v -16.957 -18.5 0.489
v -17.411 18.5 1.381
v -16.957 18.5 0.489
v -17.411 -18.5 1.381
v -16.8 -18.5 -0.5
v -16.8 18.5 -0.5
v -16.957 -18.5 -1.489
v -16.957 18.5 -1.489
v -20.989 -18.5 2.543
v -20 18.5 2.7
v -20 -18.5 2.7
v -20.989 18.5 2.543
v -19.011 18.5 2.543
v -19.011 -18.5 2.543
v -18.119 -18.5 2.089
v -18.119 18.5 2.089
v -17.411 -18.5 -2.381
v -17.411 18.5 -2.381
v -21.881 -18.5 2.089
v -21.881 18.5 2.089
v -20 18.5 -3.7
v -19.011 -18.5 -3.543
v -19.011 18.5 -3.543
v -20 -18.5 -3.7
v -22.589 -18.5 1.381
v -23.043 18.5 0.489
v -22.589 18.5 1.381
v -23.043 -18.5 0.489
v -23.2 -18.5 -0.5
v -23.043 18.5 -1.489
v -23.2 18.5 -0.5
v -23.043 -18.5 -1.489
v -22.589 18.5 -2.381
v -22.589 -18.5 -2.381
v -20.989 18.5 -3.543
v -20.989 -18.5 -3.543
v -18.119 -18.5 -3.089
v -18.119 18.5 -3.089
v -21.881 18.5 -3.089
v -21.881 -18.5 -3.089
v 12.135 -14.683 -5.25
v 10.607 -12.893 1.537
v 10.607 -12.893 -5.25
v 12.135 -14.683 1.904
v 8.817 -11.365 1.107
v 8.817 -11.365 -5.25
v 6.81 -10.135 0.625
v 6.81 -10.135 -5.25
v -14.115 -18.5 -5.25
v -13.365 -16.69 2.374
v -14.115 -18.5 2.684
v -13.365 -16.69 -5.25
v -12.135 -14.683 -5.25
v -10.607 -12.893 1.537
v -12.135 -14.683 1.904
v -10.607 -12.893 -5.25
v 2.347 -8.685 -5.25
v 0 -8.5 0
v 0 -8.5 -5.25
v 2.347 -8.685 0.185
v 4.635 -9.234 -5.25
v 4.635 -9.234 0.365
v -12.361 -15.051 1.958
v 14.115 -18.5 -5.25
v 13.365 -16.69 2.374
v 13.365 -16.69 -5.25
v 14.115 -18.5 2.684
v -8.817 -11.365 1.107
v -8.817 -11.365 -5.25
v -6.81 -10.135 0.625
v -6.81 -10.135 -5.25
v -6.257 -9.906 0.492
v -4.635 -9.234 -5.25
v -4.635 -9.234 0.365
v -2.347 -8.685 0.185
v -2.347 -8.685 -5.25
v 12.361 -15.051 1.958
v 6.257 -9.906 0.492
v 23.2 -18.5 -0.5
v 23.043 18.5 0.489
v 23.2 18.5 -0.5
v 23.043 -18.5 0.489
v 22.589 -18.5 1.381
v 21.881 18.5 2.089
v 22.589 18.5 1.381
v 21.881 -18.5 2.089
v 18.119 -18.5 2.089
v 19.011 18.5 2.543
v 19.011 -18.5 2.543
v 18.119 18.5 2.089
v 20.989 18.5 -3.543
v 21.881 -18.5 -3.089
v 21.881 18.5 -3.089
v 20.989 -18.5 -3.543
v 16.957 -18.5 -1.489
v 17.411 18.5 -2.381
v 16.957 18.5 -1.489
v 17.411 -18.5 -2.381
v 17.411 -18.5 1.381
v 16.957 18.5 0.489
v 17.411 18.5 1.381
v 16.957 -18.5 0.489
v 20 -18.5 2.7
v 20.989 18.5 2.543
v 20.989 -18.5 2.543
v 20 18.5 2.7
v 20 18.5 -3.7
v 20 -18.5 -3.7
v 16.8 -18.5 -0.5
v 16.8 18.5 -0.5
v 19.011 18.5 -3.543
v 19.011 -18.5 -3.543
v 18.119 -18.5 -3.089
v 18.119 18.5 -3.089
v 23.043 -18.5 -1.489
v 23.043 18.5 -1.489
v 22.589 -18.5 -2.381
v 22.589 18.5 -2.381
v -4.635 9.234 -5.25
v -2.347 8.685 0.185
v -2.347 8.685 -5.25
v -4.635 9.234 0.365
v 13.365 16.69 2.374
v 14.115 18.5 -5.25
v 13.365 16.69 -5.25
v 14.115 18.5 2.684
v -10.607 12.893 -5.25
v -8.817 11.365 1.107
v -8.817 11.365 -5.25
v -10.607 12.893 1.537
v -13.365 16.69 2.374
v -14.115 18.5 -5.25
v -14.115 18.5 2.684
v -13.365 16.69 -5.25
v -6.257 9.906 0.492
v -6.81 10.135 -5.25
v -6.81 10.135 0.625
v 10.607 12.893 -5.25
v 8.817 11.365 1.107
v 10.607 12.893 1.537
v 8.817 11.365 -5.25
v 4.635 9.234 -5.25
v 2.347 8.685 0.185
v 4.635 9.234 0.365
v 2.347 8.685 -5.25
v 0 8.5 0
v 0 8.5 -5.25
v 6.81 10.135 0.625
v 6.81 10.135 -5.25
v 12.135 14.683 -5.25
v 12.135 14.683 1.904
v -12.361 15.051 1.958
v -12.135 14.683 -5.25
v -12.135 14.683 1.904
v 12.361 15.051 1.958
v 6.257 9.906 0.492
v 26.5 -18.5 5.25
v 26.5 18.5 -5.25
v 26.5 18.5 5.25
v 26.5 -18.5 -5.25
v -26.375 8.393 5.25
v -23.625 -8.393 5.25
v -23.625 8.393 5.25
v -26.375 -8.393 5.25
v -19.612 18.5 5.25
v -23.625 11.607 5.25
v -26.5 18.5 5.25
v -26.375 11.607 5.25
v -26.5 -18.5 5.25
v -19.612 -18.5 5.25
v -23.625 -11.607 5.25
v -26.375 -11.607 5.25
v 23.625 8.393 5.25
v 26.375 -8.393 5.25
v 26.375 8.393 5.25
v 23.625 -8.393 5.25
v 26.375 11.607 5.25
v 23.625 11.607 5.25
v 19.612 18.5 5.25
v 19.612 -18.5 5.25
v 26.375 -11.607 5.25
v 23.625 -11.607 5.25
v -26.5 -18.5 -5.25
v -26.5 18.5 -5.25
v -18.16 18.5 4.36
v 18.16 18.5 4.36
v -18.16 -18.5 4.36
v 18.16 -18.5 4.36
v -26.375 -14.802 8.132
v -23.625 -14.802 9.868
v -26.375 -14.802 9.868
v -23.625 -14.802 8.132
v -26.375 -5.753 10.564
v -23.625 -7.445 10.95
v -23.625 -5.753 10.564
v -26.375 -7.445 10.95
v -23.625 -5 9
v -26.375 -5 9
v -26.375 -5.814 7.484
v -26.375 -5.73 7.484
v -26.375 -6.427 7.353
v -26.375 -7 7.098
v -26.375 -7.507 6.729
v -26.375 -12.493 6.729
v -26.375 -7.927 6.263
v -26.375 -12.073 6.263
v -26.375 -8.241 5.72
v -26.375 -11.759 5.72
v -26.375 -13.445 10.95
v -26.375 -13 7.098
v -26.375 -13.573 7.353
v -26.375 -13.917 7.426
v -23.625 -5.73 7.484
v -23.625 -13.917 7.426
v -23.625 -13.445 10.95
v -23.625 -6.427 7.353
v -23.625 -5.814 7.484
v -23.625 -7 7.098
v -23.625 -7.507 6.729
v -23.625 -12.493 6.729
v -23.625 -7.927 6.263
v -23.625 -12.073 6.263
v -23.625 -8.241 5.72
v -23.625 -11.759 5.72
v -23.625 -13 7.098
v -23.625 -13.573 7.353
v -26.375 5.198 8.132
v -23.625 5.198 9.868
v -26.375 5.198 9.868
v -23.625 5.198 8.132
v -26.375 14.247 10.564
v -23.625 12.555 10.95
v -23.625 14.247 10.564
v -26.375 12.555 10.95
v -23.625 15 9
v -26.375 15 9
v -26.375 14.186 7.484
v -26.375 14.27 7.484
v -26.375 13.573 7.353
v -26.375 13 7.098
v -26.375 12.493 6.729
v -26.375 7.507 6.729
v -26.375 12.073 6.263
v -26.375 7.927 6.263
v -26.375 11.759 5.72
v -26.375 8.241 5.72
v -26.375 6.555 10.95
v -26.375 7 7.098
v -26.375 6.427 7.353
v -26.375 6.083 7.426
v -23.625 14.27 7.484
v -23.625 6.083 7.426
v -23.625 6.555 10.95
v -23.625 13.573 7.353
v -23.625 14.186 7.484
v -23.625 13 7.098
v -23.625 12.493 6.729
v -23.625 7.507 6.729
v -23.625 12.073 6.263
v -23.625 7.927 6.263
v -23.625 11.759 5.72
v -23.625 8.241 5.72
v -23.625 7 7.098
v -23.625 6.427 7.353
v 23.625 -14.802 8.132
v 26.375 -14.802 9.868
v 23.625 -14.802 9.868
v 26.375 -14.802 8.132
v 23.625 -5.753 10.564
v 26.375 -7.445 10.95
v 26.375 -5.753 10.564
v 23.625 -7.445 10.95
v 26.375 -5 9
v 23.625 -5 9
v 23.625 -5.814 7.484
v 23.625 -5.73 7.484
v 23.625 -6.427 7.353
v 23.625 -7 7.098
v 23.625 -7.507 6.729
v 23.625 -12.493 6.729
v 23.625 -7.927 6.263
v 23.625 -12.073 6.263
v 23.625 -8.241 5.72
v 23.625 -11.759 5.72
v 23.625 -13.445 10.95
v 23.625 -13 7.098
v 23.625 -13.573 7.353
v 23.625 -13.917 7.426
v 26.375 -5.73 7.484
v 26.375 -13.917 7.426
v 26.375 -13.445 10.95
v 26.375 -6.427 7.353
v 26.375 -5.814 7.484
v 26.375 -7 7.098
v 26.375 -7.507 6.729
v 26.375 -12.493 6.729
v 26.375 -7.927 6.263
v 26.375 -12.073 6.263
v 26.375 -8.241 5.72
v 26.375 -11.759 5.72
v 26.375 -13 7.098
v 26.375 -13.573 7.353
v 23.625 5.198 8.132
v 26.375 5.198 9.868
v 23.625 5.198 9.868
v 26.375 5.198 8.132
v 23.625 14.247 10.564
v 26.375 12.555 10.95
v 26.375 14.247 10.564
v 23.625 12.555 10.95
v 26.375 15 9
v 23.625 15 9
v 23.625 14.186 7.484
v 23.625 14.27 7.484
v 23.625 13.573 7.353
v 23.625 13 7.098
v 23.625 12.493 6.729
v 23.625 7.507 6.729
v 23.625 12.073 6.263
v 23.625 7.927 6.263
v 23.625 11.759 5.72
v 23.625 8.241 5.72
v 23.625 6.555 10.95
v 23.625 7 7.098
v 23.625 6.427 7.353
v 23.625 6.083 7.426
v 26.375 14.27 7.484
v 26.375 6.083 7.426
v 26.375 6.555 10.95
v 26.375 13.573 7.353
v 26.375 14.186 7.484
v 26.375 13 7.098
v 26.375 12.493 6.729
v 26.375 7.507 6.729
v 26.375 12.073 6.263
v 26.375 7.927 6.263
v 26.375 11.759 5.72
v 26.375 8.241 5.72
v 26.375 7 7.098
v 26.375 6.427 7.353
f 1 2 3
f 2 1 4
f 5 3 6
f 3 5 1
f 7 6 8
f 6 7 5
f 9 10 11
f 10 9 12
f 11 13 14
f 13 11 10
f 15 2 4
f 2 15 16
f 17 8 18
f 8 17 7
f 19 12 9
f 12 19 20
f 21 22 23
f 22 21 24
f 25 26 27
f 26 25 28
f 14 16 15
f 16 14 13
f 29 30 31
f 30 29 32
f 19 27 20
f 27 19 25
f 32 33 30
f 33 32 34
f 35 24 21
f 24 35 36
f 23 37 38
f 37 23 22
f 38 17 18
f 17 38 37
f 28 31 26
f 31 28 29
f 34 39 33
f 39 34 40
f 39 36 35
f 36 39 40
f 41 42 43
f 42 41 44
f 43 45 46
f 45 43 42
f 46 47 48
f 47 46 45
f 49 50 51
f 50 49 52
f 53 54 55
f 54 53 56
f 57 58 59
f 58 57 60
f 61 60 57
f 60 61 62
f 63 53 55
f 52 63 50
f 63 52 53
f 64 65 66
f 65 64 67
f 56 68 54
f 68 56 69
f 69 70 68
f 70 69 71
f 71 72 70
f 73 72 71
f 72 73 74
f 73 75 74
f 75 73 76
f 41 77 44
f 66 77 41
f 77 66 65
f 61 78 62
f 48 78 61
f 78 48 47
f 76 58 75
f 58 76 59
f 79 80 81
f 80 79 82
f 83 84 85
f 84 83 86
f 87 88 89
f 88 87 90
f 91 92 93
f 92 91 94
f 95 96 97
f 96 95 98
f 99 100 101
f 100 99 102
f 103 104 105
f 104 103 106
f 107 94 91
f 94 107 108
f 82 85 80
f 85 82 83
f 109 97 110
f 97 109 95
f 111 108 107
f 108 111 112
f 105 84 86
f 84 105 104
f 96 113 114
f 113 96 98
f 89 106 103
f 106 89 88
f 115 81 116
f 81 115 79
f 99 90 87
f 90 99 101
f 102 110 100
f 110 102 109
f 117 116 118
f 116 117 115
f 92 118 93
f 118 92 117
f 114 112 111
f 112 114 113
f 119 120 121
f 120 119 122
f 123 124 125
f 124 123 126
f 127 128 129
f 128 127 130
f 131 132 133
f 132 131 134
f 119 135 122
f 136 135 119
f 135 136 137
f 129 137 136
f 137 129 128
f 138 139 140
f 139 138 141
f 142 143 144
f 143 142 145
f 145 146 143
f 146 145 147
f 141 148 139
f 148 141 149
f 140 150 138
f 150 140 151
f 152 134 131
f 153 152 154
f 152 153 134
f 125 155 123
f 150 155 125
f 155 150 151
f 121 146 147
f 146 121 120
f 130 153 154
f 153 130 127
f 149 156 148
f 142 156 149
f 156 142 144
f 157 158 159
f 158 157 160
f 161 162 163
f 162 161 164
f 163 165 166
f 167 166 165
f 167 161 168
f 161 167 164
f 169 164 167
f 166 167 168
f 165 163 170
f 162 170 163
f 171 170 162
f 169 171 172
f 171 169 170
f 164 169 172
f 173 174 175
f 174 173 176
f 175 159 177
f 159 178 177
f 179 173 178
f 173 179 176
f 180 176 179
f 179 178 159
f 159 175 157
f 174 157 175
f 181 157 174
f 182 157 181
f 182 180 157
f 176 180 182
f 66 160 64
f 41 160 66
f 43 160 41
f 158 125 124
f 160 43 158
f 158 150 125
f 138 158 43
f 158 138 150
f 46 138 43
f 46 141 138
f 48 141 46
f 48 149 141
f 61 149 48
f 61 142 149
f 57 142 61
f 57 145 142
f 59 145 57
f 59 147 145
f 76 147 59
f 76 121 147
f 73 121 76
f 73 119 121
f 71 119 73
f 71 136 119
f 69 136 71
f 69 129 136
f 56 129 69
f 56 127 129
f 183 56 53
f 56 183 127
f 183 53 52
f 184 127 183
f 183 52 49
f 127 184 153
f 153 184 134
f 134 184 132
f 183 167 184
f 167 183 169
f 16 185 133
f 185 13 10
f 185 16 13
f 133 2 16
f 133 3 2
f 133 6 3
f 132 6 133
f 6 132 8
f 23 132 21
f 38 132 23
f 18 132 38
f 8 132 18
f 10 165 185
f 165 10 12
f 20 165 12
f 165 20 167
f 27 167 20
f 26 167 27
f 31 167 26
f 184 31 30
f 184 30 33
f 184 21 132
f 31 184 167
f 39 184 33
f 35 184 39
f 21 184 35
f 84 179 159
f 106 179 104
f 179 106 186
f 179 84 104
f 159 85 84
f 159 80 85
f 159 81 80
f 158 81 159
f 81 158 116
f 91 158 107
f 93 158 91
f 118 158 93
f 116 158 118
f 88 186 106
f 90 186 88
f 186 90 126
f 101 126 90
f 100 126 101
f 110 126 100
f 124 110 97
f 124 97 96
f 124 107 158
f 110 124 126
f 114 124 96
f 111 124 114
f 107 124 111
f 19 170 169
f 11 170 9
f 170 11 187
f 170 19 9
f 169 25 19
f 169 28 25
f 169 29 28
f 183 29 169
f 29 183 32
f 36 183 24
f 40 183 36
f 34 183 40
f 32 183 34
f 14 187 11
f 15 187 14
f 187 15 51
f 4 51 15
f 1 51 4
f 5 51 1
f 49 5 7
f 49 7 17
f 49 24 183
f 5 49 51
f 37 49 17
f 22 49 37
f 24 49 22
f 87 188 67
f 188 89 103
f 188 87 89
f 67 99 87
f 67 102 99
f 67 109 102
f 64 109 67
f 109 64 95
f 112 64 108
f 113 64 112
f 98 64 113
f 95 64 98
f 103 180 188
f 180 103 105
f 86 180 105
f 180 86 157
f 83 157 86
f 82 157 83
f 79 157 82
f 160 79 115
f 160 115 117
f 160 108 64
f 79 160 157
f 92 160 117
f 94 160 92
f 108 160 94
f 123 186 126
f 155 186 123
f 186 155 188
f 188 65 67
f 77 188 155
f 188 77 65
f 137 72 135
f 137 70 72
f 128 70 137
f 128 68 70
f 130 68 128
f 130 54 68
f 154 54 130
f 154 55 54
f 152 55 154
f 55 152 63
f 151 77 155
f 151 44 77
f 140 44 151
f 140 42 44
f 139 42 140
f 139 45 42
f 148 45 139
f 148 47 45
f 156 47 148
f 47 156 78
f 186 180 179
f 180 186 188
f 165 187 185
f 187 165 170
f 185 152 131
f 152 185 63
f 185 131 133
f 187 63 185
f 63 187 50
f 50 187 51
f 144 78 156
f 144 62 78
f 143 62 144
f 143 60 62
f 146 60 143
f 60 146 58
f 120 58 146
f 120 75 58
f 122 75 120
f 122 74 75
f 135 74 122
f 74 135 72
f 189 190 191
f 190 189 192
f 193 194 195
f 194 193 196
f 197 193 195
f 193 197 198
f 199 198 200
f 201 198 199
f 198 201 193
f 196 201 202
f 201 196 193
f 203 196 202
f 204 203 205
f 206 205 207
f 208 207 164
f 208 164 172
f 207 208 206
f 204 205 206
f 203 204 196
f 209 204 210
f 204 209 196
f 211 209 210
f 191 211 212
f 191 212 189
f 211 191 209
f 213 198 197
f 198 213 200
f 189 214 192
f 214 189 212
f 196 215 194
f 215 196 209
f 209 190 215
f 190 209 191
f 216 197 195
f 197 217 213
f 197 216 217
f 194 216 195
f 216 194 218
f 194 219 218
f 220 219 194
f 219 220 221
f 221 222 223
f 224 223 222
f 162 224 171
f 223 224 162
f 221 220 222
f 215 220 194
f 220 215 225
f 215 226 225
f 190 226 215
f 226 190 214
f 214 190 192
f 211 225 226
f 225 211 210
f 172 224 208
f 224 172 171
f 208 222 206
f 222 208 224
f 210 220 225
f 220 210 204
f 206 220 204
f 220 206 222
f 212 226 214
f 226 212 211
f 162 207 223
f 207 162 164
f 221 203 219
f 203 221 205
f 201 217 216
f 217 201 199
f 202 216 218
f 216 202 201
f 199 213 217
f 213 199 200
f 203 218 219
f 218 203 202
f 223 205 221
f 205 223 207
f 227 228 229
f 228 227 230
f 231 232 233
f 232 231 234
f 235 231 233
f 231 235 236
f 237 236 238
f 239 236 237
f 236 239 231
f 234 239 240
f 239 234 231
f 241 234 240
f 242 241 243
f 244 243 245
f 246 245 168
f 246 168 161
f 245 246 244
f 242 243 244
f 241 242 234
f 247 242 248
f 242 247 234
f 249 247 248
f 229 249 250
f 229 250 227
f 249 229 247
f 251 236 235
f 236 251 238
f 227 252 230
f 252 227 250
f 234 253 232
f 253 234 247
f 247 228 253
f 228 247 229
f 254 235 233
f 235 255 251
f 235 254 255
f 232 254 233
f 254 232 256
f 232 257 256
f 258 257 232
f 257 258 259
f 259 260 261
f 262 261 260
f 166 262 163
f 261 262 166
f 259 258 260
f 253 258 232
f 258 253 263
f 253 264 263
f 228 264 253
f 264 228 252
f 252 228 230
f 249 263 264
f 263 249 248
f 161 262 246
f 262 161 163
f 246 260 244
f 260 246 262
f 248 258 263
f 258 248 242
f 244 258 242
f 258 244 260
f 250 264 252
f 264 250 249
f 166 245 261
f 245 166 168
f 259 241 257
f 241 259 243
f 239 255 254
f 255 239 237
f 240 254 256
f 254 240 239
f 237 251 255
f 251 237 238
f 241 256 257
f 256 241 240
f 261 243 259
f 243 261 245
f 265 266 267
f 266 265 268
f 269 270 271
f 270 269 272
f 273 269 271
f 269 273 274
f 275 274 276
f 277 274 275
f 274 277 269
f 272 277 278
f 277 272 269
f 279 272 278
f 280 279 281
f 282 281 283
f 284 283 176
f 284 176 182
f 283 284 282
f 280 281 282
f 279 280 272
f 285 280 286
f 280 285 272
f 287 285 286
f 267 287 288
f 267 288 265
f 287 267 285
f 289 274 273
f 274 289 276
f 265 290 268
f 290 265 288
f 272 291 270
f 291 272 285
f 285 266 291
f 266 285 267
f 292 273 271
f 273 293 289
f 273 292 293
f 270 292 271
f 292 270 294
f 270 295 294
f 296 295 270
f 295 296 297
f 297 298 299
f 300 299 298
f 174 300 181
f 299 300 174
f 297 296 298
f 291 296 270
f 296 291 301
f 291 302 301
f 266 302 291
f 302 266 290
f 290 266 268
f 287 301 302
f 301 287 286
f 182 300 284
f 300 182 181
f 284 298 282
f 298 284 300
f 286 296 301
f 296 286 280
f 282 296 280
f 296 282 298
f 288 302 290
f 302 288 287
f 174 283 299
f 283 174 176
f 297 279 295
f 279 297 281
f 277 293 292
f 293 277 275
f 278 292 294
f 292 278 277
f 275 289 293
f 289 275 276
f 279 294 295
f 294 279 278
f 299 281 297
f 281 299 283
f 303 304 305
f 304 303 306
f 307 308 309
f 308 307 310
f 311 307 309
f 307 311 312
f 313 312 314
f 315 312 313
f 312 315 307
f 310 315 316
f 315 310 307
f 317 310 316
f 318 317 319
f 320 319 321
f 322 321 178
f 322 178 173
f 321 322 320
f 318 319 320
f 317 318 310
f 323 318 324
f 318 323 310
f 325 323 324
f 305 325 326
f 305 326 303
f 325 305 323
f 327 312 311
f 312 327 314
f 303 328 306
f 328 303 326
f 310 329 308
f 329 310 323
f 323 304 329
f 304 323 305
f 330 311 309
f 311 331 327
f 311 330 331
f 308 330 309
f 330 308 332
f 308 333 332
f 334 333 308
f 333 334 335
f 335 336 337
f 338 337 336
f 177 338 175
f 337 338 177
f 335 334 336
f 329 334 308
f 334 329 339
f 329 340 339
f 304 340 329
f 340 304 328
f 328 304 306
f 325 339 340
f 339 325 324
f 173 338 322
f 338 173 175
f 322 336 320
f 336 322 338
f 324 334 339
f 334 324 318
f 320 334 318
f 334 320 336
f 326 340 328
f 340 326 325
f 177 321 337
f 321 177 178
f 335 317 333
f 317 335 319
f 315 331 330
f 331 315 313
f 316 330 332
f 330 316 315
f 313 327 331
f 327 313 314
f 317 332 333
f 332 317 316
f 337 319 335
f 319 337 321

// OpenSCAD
// file: dronePlates.scad
/**
 * dronePlates.scad
 * Plate library
 *
 * GNU GPL V3
 * @author: Victor Potenciano
 */

m3Rad = 3.4/2;
cornerR = 4;

/**
 *
 */
module helperDisk(diameter) {
	cylinder(r = diameter/2, h = 0.6, $fn=20);
}

/**
 *
 */
module roundedRect(size, radius) {
	x = size[0];
	y = size[1];
	z = size[2];

	linear_extrude(height=z)
	hull() {
	// place 4 circles in the corners, with the given radius
	translate([(-x/2)+(radius/2), (-y/2)+(radius/2), 0]){ circle(r=radius); }
	translate([(x/2)-(radius/2), (-y/2)+(radius/2), 0]){ circle(r=radius); }
	translate([(-x/2)+(radius/2), (y/2)-(radius/2), 0]){ circle(r=radius); }
	translate([(x/2)-(radius/2), (y/2)-(radius/2), 0]){ circle(r=radius); }
	}
}

/**
 * rounded rectangle triangle with corner at origin
 */
module roundedTriangle(size, radius) {
	x = size[0];
	y = size[1];
	z = size[2];

	linear_extrude(height=z)
	hull() {
	translate([radius, radius, 0]){ circle(r=radius); }
	translate([x-radius, radius, 0]){ circle(r=radius); }
	translate([radius, y-radius, 0]){ circle(r=radius); }
	}
}

/**
 *
 */
module roundRectPlate(w, l, plateThick=3) {
	difference(){
		roundedRect([l+m3Rad*1.75,w+m3Rad*1.75,plateThick], cornerR);
		translate([l/2, w/2, -0.5]) { cylinder(h = plateThick+1, r = m3Rad, $fn=30); }
		translate([-l/2, w/2, -0.5]) { cylinder(h = plateThick+1, r = m3Rad, $fn=30); }
		translate([l/2, -w/2, -0.5]) { cylinder(h = plateThick+1, r = m3Rad, $fn=30); }
		translate([-l/2, -w/2, -0.5]) { cylinder(h = plateThick+1, r = m3Rad, $fn=30); }
	}
}

/**
 *
 */
module crossSquarePlate(l, thick=3) {
	inDist = cornerR*2+4;
	trianL = sqrt((l*l)/2)-inDist;
	centerR = 4;

	difference(){
		roundRectPlate(l, l, thick);
		translate([0, centerR, -0.5]) { 
			rotate([0,0,45]){ roundedTriangle([trianL,trianL,thick+1], cornerR-2); }
		}
		translate([0, -centerR, -0.5]) { 
			rotate([0,0,225]){ roundedTriangle([trianL,trianL,thick+1], cornerR-2); }
		}
		translate([-centerR, 0, -0.5]) { 
			rotate([0,0,135]){ roundedTriangle([trianL,trianL,thick+1], cornerR-2); }
		}
		translate([centerR, 0, -0.5]) { 
			rotate([0,0,-45]){ roundedTriangle([trianL,trianL,thick+1], cornerR-2); }
		}
	}
}

/**
 *
 */
module hShapePlate(w, l, thick=4) {
	inDist = cornerR*2+1;

	difference(){
		roundRectPlate(w, l, thick);
		translate([0, w/4, -0.5]) { roundedRect([l-inDist,w/2-inDist,thick+1], cornerR-2); }
		translate([0, -w/4, -0.5]) { roundedRect([l-inDist,w/2-inDist,thick+1], cornerR-2); }
	}
}

/**
 *
 */
module motorCircleMount(inDia, outDia, thick=3, extraH=false, d1=19, d2=16, holeR=m3Rad ) {
	difference(){
		cylinder(h = thick, r = outDia/2, $fn=30);
		motorCircleMountHoles(inDia, outDia, thick, extraH, d1=d1, d2=d2, holeR=holeR);
	}
}

/**
 *
 */
module motorCircleMountHoles(inDia, outDia, thick=3, extraH=false, d1=19, d2=16, d3=25, holeR=m3Rad) {
	translate([0, 0, -0.5]) { cylinder(h = thick+1, r = inDia/2, $fn=30); }

	for(i=[0:3]) {
		rotate([0,0,90*i]){
		translate([d1/2, 0, -0.5]) cylinder(h = thick+1, r = holeR, $fn=20);
		translate([d2/2, 0, -0.5]) cylinder(h = thick+1, r = holeR, $fn=20);
		translate([d2/2, -holeR, -0.5]) cube(size = [(d1-d2)/2,holeR*2,thick+1]);
		}
	}
	
	if(extraH==true){	
		for(i=[-1,1]) translate([i*d3/2, 0, -0.5]) { cylinder(h = thick+1, r = holeR, $fn=30); }
	}
}

/**
 *
 */
module motorRectMount(w, l, inDia, thick=3) {
	d1=19;
	d2=16;

	difference(){
		roundRectPlate(w, l, thick);
		translate([0, 0, -0.5]) { cylinder(h = thick+1, r = inDia/2, $fn=30); }
		translate([0, d1/2, -0.5]) { cylinder(h = thick+1, r = m3Rad, $fn=30); }
		translate([0, -d1/2, -0.5]) { cylinder(h = thick+1, r = m3Rad, $fn=30); }
		translate([d2/2, 0, -0.5]) { cylinder(h = thick+1, r = m3Rad, $fn=30); }
		translate([-d2/2, 0, -0.5]) { cylinder(h = thick+1, r = m3Rad, $fn=30); }
	}
}

/**
 *
 */
module tube(inDia, outDia, height) {
	difference(){
		cylinder(h = height, r = outDia/2, $fn=50);
		translate([0, 0, -0.5]) { cylinder(h = height+1, r = inDia/2, $fn=30); }
	}
}

/**
 *
 */
module squareTube(inDia, outDia, height) {
	translate([0,0,height/2]){
	difference(){
		cube(size = [outDia,outDia,height], center = true);
		cube(size = [inDia,inDia,height+1], center = true);
	}
	}
}

/**
 *
 */
module djiFlamewheelHoles(height) {
	a = 23;
	b = 16;
	c = 19.5;
	
	translate([a/2, c/2, 0]) { cylinder(h = height, r = m3Rad, $fn=30); }
	translate([-a/2, c/2, 0]) { cylinder(h = height, r = m3Rad, $fn=30); }
	translate([b/2, -c/2, 0]) { cylinder(h = height, r = m3Rad, $fn=30); }
	translate([-b/2, -c/2, 0]) { cylinder(h = height, r = m3Rad, $fn=30); }
}

/**
 *
 */
module djiFlamewheelHolesBotton(height) {
	a1 = 21;
	c = 19.5;
	
	translate([a1/2, c/2, 0]) { cylinder(h = height, r = m3Rad, $fn=30); }
	translate([-a1/2, c/2, 0]) { cylinder(h = height, r = m3Rad, $fn=30); }
}

/**
 *
 */
module propeller(size){
union(){
difference(){
	cylinder(h = 3, r = size/2, center=true, $fn=30);
	cylinder(h = 3.1, r = size/2-2, center=true, $fn=30); 
}
for( i = [-1,1] ){
rotate([0,0,45*i]){ cube(size = [size,4,1], center = true); }
}
}
}

/**
 *
 */
module slot(length, height, rad){
for(i=[-1,1]) translate([i*length/2,0,0]) cylinder(h = height, r = rad, $fn=30);
translate([0,0,height/2]) cube(size = [length,rad*2,height], center = true);
}

 

////////////////////////
// Examples:
////////////////////////

motorCircleMount(8, 25, 3.5);

//roundedRect([50,50,3], 4);

//hShapePlate(79, 25);

//rotate([0,0,45]){roundedTriangle([40,40,3], 4);}

//crossSquarePlate(45, 4);

/*
union(){
motorRectMount(21, 18, 8, 4);
translate([9, 10.5, 0]) {tube(m3Rad*2, 6.5, 6);}
}
*/

/*
difference(){
union(){
hShapePlate(50, 30, 3.5);
translate([-4,-25,0]){cube(size = [8,50,3.5]);}
rotate([0, 0, 45]) {motorCircleMount(8, 35, 3.5);}
}
cylinder(h = 10, r = 4, $fn=100, center=true);
}
*/

//rotate([90,0,0]){ tube(5,10,20); }
//translate([20,0,0]){ squareTube(5, 10, 20); }
// main file
/**
 * tbs discovery gopro mount 
 */
 
use <dronePlates.scad>

module notch(){
    thick=2.75;
    translate([0,0,-thick/2])
    difference(){
        union(){
        roundedRect([8,2,thick],2);
        translate([-3.5,-5,0])cube(size=[7,5,thick]);
        }
        
        for(i=[-1,1]) translate([4.5*i,-4.5,0]) cylinder(r=3,h=6,$fn=30,center=true);
    }
}

difference(){
    cube(size=[40+13,37,10.5], center=true);
    
    for(i=[-1,1]){ 
        translate([i*40/2,0,-0.5]) rotate([90,0,0]) cylinder(r=6.4/2,h=38,center=true,$fn=20);
        translate([0,i*(37/2+5),0]) cylinder(r=15,h=15,center=true,$fn=40);
    }
        
    translate([0,0,40]) rotate([90,0,0]) cylinder(r=40,h=38,center=true,$fn=40);
    
}

for(i=[-1,1]) for(j=[-1,1]){
        translate([i*50/2,j*20/2,9]) rotate([90,0,90]) notch();
    }
